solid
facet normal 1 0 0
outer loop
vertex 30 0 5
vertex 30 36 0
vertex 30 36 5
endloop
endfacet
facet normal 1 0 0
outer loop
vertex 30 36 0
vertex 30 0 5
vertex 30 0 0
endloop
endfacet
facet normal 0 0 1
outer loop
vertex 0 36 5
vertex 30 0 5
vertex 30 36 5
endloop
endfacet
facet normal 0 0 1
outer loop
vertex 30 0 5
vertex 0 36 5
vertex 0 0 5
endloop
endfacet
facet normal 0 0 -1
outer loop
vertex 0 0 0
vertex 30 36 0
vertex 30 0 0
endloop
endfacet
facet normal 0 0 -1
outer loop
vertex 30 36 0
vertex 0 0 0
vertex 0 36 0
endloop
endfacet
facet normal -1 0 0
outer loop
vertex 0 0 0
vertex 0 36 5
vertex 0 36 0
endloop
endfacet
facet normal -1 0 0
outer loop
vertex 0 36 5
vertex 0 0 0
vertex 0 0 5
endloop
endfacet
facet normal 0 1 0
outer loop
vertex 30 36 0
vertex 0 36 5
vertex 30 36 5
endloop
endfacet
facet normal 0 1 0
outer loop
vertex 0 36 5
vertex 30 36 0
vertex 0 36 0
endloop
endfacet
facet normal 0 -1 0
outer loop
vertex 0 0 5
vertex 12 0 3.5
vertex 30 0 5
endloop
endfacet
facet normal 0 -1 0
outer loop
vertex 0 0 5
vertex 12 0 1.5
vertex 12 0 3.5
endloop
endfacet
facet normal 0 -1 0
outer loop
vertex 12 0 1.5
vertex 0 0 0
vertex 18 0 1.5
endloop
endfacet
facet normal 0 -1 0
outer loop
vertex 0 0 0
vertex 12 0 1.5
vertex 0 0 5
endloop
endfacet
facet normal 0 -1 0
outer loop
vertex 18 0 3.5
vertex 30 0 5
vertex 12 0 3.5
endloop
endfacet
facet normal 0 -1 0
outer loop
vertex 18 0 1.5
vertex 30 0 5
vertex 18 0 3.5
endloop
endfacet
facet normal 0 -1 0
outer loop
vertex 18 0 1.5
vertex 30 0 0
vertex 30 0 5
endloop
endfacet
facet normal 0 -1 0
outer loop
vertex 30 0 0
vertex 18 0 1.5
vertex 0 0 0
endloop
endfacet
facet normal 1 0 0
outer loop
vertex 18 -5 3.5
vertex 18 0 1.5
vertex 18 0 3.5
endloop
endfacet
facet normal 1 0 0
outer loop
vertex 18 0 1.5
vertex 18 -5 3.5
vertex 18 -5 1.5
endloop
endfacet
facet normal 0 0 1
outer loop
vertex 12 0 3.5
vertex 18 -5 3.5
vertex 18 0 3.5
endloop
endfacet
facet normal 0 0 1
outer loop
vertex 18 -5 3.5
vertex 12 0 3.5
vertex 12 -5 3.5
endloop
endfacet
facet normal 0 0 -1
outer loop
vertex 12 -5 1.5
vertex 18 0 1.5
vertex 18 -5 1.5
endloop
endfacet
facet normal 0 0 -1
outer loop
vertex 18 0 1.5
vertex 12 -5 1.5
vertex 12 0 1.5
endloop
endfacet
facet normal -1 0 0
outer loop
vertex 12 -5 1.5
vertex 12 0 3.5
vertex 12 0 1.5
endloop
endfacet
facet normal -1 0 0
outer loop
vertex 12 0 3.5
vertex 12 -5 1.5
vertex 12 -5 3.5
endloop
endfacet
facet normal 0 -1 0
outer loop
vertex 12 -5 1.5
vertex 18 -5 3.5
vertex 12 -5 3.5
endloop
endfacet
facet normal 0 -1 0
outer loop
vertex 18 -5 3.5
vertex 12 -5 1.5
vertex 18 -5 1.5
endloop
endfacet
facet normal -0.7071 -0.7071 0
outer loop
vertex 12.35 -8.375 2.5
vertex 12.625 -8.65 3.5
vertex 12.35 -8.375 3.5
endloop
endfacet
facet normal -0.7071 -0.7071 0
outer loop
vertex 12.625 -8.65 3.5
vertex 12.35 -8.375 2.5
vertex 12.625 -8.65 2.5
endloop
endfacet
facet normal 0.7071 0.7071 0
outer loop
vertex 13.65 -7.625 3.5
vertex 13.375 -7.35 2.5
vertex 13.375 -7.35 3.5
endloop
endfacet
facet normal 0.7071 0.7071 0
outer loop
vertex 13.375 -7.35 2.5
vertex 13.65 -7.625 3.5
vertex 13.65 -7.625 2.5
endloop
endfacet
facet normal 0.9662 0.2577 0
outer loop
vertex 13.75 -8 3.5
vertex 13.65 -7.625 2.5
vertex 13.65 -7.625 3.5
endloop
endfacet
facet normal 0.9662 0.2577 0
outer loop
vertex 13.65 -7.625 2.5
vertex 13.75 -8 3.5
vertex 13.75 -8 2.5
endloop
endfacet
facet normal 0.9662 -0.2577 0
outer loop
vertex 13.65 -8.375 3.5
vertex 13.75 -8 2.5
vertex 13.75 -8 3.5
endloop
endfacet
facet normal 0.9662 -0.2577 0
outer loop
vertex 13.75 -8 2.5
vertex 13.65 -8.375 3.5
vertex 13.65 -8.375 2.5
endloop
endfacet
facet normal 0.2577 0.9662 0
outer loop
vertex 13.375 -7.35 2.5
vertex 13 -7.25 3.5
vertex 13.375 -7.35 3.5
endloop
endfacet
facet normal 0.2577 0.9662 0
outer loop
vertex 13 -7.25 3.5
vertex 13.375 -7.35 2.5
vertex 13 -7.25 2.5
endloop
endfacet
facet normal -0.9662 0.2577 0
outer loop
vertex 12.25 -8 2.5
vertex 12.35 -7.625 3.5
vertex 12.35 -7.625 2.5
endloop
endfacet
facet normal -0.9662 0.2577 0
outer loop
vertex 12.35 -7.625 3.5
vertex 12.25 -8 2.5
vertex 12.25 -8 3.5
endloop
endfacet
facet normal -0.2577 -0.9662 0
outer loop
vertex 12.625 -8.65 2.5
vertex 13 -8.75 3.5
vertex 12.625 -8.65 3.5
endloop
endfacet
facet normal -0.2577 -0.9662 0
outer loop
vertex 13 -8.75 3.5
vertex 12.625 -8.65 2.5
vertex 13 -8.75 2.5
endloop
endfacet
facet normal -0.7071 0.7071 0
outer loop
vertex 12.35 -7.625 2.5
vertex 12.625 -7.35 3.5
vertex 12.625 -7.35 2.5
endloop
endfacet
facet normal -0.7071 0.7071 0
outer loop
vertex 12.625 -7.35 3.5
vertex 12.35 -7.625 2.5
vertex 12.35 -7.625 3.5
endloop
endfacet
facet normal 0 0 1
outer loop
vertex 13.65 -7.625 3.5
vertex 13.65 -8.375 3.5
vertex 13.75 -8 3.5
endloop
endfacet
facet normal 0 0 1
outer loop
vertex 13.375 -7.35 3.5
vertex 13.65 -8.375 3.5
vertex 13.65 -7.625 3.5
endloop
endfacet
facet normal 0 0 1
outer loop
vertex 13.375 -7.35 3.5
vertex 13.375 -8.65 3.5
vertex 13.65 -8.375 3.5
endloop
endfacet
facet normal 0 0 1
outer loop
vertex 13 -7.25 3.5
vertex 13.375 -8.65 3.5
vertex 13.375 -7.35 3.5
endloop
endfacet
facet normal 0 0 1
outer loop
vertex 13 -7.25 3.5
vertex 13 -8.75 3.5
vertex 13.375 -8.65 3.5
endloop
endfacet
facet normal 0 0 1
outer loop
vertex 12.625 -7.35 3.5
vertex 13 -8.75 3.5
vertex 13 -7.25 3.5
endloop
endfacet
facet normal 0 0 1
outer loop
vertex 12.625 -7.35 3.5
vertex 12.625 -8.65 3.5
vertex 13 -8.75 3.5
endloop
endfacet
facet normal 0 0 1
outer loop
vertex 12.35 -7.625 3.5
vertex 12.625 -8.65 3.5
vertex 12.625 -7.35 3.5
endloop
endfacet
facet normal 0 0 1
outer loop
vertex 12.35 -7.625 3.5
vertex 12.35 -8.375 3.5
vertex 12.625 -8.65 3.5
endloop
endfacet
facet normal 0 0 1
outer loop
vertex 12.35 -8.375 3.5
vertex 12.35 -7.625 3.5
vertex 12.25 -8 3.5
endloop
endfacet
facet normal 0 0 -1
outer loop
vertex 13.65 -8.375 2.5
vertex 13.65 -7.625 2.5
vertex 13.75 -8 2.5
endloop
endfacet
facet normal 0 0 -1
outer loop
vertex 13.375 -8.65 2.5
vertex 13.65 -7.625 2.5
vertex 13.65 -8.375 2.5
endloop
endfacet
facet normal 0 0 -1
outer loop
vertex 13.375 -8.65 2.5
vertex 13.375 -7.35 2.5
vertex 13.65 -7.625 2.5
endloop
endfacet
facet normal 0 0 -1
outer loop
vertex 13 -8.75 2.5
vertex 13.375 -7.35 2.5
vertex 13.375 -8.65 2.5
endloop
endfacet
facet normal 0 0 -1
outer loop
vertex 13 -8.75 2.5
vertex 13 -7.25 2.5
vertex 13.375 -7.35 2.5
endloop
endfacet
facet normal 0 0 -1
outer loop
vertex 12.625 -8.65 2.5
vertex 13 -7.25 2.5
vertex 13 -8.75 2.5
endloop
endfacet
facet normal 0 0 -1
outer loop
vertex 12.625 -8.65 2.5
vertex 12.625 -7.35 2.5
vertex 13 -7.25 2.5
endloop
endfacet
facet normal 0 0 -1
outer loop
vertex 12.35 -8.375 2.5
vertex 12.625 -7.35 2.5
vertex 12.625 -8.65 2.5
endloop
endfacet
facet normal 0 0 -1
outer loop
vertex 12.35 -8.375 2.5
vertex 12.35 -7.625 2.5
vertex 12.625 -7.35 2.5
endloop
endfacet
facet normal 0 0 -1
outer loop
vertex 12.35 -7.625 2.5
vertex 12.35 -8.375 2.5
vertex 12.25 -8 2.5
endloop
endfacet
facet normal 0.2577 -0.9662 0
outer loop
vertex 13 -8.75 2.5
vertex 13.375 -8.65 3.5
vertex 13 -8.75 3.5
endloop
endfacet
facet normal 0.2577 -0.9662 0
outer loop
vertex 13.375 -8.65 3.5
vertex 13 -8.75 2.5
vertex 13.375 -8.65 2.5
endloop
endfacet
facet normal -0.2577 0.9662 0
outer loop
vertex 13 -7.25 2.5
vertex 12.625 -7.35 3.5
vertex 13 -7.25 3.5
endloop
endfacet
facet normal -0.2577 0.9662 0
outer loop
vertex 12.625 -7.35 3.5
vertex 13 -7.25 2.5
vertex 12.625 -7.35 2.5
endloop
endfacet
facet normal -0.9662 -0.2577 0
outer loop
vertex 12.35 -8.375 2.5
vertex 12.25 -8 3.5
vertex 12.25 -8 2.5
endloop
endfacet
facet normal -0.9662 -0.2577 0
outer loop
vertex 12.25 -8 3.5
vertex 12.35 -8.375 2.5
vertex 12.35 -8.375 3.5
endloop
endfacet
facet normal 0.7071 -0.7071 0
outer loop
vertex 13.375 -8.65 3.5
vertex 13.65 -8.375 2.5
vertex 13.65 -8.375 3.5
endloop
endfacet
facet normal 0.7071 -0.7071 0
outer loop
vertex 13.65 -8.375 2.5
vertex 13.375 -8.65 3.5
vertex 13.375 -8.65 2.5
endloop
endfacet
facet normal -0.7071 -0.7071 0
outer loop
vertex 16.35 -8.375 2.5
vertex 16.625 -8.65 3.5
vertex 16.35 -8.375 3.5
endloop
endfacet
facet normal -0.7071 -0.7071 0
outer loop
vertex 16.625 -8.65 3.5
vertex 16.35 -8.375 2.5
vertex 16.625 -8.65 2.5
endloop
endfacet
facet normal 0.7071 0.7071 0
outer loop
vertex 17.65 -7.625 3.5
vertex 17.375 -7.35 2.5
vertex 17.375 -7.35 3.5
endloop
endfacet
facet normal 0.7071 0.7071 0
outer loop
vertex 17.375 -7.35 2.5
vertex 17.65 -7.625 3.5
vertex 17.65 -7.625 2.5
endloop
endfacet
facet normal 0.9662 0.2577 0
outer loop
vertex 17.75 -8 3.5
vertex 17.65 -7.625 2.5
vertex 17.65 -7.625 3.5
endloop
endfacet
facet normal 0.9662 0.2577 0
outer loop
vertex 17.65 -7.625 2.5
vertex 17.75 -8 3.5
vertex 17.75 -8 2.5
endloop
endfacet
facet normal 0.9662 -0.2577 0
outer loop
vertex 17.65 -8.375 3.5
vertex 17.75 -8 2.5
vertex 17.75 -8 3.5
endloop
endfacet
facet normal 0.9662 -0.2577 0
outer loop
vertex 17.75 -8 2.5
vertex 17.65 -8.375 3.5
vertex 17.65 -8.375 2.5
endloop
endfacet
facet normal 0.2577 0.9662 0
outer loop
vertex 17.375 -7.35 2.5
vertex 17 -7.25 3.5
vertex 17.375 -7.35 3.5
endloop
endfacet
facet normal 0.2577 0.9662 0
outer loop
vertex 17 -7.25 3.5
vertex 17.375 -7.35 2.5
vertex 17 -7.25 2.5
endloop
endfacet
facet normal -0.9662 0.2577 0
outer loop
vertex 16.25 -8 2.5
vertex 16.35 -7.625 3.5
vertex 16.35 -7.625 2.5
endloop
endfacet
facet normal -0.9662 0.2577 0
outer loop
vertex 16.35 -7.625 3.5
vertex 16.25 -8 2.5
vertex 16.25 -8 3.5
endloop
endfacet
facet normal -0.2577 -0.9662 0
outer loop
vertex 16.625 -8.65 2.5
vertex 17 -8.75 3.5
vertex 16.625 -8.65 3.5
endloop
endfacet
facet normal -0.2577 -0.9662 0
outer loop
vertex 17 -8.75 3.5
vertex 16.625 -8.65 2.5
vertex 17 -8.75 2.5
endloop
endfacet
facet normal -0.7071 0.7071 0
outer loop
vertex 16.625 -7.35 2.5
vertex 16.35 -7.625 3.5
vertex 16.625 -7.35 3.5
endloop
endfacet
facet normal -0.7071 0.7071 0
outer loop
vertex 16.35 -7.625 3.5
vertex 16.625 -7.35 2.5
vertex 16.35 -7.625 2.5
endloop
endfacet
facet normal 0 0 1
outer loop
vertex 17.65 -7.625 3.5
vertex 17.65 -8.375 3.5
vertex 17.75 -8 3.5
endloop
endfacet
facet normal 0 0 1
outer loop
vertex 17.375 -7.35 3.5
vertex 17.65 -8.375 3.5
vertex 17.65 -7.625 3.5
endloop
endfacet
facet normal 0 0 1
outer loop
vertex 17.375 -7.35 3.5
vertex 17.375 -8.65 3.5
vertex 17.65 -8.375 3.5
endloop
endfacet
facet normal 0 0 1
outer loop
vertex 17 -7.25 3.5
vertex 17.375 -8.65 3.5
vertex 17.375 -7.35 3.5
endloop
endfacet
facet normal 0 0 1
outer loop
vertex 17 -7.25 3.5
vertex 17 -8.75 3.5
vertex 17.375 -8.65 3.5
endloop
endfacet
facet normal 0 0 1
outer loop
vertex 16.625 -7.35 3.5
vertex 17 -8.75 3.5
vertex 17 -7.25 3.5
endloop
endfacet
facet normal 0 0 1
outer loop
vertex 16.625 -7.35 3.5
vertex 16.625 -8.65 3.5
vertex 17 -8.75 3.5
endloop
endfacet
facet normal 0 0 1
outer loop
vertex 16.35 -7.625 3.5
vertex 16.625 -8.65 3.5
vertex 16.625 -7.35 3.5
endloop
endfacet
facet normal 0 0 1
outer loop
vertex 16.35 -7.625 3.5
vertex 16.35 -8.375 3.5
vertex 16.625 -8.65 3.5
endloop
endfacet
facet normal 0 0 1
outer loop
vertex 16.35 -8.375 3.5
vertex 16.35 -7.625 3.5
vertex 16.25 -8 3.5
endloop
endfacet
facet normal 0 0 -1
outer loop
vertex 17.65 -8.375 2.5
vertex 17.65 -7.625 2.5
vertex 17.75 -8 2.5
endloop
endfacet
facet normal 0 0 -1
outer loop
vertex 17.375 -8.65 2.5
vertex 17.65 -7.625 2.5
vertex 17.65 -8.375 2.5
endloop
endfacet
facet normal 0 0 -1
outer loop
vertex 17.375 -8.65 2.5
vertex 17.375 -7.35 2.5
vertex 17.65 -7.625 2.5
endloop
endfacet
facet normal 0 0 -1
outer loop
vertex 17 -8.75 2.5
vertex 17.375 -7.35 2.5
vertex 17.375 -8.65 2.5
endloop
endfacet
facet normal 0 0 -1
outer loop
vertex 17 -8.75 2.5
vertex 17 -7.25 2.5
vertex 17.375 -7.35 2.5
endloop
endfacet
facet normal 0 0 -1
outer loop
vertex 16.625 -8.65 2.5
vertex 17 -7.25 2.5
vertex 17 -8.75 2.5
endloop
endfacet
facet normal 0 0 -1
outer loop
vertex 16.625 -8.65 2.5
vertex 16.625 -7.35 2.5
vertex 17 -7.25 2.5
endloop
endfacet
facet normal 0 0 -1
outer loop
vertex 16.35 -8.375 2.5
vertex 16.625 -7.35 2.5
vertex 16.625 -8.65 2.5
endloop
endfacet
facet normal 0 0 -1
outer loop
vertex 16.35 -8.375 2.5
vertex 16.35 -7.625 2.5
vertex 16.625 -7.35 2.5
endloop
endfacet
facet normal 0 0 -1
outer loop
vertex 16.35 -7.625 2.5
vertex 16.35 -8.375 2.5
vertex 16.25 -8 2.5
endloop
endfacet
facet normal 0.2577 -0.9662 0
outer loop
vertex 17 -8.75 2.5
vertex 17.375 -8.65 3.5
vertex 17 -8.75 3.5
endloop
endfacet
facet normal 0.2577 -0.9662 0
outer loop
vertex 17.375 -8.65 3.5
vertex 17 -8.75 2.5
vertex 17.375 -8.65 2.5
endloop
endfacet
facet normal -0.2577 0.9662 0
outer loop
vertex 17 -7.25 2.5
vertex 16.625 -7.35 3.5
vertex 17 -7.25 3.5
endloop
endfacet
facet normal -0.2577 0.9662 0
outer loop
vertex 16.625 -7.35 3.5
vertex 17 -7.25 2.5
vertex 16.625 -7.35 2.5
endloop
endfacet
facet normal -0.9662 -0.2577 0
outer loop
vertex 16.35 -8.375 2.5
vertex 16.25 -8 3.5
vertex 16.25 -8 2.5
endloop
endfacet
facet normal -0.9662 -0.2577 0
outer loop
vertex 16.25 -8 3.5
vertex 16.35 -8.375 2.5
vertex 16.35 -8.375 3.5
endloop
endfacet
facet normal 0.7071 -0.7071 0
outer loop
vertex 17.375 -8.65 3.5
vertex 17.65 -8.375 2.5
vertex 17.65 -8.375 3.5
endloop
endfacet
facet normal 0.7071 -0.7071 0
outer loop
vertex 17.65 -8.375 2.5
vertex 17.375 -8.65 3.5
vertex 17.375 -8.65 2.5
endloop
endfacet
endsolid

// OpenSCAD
// =============================================================================
// 500mAh LiPo Battery - Reference Model
// Adafruit product 1578 or equivalent
// For fitment verification only - not for printing
// =============================================================================

// Include parameters (safe to include multiple times)
include <../parameters.scad>

module battery_500mah() {
    color(color_battery) {
        // Main battery pouch
        cube([battery_width, battery_length, battery_height]);

        // JST connector and wires (one end)
        translate([battery_width/2 - 3, -5, battery_height/2 - 1])
            cube([6, 7, 2]);

        // Wires
        color([1, 0, 0])
        translate([battery_width/2 - 2, -8, battery_height/2])
            cylinder(h=1, d=1.5, $fn=12);

        color([0, 0, 0])
        translate([battery_width/2 + 2, -8, battery_height/2])
            cylinder(h=1, d=1.5, $fn=12);
    }
}

// Preview (renders when opening this file directly)
battery_500mah();
